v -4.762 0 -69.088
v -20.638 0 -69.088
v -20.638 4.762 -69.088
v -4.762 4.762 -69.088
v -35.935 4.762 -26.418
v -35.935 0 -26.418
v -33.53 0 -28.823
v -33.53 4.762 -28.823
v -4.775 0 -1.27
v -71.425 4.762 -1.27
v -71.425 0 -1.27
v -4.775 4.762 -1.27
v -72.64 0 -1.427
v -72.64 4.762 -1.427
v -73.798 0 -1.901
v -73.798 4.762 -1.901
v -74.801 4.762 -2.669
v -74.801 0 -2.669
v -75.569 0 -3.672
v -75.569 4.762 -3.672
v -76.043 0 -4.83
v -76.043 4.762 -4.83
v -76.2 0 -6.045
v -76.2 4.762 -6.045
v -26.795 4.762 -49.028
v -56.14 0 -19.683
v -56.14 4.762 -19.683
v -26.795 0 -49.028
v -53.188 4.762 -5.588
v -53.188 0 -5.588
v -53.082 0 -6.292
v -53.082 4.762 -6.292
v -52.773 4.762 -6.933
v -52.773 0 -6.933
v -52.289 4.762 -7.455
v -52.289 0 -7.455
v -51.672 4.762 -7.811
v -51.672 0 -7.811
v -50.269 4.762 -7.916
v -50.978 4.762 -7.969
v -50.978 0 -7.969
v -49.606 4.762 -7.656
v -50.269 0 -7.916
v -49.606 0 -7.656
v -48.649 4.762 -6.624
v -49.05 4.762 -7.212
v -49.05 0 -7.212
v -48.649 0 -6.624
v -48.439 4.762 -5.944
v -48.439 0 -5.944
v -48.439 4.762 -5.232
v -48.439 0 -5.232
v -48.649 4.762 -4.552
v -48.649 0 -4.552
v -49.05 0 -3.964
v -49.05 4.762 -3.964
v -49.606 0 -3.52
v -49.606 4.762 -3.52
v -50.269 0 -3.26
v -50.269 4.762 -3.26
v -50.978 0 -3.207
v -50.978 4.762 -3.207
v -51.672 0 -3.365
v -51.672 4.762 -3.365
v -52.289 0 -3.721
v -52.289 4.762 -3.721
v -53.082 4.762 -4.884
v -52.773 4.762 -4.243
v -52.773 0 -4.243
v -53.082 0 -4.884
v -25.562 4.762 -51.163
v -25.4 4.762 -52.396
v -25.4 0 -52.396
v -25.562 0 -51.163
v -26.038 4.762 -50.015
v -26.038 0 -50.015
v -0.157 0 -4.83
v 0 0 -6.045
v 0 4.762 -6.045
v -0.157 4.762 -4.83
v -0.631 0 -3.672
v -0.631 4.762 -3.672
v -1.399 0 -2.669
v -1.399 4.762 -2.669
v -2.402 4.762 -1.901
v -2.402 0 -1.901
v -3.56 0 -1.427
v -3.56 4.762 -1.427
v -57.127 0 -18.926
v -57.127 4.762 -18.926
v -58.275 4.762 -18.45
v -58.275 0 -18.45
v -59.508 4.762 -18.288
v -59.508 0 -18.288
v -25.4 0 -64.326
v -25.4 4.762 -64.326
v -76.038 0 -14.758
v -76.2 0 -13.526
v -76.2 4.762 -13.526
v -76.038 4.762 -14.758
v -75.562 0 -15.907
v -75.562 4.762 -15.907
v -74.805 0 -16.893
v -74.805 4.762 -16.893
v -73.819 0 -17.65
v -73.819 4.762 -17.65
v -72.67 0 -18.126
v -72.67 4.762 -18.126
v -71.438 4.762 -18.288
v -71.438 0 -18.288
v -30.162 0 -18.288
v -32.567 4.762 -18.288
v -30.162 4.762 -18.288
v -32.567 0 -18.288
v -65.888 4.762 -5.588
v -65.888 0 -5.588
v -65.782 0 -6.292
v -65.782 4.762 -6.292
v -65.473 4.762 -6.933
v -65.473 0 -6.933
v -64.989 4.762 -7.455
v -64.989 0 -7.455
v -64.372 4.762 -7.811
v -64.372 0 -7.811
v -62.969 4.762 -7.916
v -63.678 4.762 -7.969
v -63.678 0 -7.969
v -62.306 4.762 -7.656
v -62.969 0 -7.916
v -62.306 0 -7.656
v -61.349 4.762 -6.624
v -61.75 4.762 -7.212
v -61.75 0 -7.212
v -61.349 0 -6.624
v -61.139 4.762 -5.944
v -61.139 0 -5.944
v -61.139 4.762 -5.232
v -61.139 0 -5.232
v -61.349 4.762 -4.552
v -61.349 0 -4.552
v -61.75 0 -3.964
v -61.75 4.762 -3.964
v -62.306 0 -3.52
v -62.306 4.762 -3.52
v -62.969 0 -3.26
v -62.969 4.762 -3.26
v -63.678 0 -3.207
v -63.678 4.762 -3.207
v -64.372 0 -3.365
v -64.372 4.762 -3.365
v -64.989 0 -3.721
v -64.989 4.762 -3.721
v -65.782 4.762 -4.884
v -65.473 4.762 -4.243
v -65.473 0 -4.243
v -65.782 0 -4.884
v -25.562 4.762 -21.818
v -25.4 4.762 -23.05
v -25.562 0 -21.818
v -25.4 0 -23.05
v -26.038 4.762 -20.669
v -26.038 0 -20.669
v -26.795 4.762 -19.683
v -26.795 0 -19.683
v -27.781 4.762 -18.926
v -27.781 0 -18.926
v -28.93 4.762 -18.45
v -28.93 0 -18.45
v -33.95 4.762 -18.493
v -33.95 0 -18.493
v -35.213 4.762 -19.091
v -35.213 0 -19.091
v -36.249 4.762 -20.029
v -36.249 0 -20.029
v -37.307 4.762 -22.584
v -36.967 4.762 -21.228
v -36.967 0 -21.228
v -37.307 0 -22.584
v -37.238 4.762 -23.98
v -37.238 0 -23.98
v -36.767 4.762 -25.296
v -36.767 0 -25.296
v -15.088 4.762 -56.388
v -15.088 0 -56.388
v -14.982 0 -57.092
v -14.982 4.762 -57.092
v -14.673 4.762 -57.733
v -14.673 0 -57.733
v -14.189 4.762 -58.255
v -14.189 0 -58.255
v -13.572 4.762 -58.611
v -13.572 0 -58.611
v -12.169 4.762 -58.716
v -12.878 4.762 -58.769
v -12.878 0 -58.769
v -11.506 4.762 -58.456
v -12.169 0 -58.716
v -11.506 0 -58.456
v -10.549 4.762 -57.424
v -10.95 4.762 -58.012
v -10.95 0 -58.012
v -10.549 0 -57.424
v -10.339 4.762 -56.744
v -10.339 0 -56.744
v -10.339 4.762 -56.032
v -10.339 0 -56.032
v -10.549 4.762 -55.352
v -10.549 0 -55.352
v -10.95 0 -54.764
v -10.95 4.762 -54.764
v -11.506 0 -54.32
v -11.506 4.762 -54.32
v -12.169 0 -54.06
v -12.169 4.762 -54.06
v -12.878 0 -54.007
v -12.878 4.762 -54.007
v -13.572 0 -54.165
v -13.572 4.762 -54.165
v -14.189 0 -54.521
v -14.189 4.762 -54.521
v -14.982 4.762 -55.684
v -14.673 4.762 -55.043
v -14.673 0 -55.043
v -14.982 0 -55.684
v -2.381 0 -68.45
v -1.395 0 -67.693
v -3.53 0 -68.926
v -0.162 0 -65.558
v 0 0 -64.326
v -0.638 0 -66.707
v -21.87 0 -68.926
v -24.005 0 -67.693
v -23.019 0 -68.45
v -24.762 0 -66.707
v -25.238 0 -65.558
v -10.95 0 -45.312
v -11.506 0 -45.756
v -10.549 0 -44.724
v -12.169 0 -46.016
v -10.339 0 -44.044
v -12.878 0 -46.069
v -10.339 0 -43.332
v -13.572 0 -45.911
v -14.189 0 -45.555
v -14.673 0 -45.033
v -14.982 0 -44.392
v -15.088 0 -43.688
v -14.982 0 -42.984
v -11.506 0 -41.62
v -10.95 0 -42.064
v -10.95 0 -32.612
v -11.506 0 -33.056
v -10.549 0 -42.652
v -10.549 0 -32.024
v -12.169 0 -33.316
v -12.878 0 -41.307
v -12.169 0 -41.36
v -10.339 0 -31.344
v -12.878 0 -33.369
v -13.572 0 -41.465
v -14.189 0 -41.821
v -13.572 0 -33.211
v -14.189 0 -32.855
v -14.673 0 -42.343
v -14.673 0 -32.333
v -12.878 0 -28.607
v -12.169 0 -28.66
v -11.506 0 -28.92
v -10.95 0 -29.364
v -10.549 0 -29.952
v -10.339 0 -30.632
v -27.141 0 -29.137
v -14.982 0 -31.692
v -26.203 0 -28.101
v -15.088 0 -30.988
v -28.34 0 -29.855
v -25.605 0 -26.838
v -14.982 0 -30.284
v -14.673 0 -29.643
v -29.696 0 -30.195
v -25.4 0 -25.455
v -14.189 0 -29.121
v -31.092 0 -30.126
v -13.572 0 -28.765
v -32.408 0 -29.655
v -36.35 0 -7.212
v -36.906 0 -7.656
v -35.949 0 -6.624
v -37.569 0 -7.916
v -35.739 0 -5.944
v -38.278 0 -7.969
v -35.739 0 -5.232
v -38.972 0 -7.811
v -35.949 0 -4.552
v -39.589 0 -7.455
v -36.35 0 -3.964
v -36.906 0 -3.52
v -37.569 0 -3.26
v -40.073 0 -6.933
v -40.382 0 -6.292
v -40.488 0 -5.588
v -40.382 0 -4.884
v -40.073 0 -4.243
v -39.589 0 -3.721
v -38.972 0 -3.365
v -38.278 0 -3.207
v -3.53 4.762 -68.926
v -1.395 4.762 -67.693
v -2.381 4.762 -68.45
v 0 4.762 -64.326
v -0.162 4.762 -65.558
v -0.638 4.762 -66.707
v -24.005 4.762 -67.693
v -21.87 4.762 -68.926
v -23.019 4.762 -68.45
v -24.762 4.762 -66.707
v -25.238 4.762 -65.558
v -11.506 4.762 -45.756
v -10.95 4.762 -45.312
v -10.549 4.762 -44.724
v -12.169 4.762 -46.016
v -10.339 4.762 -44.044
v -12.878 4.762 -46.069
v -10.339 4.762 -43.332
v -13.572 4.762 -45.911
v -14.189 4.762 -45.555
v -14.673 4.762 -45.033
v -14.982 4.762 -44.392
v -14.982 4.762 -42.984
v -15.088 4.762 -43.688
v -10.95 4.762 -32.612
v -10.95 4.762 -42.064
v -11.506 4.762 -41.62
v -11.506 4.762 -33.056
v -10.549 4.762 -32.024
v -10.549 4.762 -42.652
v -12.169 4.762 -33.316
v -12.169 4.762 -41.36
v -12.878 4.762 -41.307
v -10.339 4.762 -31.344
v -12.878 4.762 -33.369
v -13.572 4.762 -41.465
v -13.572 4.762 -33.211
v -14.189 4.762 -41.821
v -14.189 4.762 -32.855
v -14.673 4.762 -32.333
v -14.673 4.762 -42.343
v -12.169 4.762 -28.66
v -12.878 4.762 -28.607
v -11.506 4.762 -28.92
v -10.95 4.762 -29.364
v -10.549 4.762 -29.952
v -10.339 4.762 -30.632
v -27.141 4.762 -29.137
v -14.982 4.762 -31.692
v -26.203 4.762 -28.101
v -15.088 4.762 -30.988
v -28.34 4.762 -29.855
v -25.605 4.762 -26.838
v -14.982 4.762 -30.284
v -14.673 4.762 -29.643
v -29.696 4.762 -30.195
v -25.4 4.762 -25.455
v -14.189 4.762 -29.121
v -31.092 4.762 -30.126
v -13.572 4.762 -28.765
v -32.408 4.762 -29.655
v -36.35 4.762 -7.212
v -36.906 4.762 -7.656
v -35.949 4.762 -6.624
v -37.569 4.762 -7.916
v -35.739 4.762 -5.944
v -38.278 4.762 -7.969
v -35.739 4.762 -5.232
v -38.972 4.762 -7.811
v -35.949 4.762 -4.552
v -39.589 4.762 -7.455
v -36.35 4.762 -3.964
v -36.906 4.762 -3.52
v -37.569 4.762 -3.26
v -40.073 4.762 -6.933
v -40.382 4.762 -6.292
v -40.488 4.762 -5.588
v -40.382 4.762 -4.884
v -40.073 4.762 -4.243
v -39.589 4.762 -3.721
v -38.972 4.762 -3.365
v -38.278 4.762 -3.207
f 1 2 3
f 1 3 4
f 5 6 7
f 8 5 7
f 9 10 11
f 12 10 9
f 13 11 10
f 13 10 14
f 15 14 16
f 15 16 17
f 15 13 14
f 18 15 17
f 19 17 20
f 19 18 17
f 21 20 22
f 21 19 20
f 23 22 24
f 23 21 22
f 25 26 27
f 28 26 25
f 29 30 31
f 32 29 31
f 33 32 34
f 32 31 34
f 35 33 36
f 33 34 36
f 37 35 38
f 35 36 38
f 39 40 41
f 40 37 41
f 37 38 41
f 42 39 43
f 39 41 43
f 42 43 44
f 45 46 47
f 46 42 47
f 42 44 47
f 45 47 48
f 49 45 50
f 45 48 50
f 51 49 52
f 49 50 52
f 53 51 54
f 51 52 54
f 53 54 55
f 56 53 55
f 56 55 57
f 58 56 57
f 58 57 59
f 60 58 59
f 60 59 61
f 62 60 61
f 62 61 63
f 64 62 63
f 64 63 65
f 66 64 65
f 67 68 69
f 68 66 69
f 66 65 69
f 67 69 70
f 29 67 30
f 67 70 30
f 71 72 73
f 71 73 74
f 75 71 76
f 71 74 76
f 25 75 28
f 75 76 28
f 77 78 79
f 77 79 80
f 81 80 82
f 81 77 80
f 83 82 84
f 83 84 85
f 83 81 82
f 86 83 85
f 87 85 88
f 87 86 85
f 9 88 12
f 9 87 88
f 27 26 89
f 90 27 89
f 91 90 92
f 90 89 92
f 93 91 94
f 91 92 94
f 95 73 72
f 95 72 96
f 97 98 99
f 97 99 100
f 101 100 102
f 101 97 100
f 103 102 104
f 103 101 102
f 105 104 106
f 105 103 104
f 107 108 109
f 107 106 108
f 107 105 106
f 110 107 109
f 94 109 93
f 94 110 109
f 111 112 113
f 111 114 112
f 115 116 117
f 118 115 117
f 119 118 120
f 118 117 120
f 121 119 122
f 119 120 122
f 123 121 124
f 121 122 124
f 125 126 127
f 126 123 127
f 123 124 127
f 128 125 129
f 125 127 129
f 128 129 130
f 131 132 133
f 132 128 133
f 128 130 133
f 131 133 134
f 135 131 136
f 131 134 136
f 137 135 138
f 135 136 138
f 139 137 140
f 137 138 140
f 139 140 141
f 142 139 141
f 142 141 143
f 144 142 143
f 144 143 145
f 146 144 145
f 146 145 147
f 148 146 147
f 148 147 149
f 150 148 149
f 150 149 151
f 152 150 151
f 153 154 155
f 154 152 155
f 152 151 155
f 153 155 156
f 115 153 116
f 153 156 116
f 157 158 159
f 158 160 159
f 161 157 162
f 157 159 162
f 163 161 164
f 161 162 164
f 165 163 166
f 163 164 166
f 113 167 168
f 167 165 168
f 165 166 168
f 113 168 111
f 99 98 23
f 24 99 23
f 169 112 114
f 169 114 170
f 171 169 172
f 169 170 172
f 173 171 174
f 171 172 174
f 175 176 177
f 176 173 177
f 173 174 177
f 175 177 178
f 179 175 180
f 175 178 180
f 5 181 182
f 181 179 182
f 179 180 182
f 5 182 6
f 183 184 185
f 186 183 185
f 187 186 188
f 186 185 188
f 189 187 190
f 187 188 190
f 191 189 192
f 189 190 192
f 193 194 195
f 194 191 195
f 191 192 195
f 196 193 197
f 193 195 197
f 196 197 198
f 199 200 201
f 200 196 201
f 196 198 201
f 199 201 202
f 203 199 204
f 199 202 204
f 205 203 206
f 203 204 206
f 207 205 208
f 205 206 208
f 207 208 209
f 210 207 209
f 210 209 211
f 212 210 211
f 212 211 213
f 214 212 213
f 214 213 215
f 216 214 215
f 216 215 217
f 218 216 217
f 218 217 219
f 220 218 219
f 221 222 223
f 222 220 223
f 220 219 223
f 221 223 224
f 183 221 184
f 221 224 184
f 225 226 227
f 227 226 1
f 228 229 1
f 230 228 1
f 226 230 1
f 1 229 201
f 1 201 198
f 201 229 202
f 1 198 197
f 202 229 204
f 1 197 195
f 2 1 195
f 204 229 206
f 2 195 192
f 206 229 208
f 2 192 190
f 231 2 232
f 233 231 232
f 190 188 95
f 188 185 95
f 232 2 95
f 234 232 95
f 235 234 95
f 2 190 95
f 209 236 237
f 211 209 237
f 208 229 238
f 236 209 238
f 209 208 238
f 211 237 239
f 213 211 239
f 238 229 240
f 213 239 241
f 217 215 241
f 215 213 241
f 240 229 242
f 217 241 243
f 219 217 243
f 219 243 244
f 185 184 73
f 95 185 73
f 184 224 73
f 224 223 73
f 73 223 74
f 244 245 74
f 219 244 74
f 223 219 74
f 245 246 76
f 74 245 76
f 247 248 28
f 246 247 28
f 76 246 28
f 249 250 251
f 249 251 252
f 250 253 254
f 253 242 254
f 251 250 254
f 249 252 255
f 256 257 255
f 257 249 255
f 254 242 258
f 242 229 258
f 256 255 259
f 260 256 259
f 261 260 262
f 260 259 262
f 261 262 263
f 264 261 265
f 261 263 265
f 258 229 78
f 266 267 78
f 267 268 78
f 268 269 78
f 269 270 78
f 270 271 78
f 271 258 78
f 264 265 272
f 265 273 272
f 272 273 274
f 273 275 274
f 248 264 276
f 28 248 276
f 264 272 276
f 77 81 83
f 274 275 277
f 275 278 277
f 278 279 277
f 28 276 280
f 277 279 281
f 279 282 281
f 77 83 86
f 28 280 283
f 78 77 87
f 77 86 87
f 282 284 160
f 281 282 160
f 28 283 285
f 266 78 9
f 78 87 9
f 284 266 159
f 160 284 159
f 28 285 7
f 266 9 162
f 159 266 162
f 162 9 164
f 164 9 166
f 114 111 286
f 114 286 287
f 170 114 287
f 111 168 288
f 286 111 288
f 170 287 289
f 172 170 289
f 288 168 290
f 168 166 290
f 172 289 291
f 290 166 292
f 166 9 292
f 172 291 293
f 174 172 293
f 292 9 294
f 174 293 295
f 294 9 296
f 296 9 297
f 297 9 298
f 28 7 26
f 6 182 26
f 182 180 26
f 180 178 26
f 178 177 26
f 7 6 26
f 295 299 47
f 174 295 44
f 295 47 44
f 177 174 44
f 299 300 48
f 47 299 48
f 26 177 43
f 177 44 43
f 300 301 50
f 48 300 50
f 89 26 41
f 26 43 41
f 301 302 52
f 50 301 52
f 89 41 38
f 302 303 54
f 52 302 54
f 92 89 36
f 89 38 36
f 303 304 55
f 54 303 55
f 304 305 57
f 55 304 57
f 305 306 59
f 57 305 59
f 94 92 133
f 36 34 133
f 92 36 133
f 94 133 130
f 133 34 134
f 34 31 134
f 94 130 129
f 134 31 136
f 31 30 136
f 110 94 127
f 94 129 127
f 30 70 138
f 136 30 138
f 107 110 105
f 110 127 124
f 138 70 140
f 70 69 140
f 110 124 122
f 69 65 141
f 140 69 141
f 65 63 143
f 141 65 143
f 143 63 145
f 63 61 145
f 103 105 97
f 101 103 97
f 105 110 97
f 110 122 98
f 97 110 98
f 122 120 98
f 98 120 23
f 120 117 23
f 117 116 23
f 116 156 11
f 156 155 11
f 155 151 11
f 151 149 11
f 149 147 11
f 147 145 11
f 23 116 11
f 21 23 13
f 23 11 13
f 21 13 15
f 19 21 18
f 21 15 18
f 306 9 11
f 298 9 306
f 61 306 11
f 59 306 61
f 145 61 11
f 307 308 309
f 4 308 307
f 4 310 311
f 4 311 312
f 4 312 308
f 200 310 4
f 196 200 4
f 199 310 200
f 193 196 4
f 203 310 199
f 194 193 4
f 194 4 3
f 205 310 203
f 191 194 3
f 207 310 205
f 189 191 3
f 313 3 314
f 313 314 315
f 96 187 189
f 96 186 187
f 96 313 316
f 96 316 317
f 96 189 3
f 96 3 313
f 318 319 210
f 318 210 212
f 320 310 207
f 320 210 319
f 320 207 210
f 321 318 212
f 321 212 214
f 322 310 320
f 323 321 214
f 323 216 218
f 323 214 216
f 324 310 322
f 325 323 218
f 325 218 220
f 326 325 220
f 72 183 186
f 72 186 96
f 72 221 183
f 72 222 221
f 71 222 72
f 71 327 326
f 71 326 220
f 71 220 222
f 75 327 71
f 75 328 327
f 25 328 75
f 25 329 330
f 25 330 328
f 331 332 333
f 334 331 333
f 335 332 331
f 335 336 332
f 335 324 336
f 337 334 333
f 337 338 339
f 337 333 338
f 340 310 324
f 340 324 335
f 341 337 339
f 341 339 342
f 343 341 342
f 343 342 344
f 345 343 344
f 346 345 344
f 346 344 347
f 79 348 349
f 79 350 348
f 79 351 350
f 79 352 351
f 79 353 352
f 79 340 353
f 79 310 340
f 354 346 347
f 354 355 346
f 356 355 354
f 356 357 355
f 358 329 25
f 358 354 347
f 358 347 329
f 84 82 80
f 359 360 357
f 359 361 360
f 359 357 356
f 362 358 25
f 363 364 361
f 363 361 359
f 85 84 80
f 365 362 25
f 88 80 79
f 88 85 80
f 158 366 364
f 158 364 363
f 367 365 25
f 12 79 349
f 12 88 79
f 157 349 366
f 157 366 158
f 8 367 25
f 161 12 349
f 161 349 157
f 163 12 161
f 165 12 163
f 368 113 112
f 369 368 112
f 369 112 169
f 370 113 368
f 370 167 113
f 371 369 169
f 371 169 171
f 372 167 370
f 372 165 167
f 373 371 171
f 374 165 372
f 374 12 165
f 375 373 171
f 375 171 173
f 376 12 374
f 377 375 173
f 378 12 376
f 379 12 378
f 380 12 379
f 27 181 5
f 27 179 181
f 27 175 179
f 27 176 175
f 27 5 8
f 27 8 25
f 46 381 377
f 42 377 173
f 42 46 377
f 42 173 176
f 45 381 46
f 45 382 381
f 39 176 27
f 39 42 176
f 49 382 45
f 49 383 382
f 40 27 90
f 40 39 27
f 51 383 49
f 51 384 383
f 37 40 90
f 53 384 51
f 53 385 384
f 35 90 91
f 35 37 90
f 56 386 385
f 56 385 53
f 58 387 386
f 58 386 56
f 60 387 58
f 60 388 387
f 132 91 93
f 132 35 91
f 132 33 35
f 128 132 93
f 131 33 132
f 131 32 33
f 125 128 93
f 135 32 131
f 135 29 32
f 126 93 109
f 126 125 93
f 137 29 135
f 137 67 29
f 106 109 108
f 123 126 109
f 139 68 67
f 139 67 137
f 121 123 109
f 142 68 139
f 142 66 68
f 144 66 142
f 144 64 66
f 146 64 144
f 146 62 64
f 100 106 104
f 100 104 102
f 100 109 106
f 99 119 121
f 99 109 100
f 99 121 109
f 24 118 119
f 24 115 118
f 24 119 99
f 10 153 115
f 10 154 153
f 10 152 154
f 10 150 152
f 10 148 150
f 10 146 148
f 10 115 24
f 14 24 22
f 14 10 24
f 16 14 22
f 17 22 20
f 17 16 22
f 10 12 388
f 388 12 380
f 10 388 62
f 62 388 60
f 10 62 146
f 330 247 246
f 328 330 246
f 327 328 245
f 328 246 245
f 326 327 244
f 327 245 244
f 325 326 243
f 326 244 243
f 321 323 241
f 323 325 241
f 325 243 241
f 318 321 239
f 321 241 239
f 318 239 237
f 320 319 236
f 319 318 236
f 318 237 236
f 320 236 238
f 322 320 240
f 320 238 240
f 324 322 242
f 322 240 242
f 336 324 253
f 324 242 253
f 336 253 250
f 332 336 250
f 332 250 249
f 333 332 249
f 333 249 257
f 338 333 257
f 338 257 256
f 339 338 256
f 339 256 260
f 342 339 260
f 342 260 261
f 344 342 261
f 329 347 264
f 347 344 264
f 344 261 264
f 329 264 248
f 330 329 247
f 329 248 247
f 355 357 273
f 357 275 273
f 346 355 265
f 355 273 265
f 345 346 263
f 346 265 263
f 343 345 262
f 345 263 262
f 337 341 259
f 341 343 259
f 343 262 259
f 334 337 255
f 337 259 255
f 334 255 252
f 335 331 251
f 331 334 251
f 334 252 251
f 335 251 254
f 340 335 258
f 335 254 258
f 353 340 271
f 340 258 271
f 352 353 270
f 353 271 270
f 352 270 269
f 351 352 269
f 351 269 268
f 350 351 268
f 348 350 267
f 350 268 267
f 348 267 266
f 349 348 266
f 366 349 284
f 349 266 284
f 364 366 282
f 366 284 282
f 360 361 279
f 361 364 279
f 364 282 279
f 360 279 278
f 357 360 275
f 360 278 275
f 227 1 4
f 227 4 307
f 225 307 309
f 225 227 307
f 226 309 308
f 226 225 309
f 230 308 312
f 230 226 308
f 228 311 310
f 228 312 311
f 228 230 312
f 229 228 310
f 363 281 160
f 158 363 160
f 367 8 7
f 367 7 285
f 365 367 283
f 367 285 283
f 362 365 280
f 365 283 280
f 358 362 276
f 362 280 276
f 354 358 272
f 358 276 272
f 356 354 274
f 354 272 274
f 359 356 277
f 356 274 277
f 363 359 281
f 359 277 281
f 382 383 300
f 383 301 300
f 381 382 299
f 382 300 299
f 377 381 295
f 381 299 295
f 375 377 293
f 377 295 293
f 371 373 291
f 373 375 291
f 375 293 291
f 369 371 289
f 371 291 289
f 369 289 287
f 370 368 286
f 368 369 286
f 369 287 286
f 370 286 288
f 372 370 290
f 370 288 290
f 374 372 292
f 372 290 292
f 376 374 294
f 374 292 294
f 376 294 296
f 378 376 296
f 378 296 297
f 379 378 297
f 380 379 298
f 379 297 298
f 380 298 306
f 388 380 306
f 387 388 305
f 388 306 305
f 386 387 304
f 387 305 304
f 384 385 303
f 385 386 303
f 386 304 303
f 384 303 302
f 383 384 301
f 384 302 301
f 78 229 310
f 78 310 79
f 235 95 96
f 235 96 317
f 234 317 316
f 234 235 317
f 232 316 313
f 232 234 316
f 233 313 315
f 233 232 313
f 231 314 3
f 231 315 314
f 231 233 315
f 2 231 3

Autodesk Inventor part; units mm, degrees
ref_plane "YZ Plane" through (0, 0, 0) normal (1, 0, 0) x (0, 1, 0)
ref_plane "XZ Plane" through (0, 0, 0) normal (0, 1, 0) x (-1, 0, 0)
ref_plane "XY Plane" through (0, 0, 0) normal (0, 0, 1) x (1, 0, 0)
sketch "Sketch1" plane through (0, 0, 0) normal (0, 1, 0) x (-1, 0, 0)
  line L0 (0, 7.112) -> (15.875, 7.112) construction
  line L1 (20.6375, -69.088) -> (4.7625, -69.088)
  line L2 (0, -64.3255) -> (0, -4.7625)
  line L3 (30.1625, -18.288) -> (76.2, -18.288) construction
  line L4 (76.2, -13.5255) -> (76.2, -4.7625)
  line L5 (71.4375, 0) -> (4.7625, 0)
  line L6 (25.4, -69.088) -> (25.4, -23.0505) construction
  arc A0 (30.1625, -18.288) -> (25.4, -23.0505) centre (30.1625, -23.0505) ccw construction
  arc A1 (0, -64.3255) -> (4.7625, -69.088) centre (4.7625, -64.3255) ccw
  arc A2 (76.2, -4.7625) -> (71.4375, 0) centre (71.4375, -4.7625) ccw
  arc A3 (4.7625, 0) -> (0, -4.7625) centre (4.7625, -4.7625) ccw
  circle A4 centre (12.7, -30.988) radius 2.3876
  circle A5 centre (12.7, -43.688) radius 2.3876
  circle A6 centre (12.7, -56.388) radius 2.3876
  circle A7 centre (63.5, -5.588) radius 2.3876
  circle A8 centre (50.8, -5.588) radius 2.3876
  circle A9 centre (38.1, -5.588) radius 2.3876
  line L7 (76.2, -5.588) -> (0, -5.588) construction
  line L8 (12.7, 0) -> (12.7, -69.088) construction
  line L9 (61.8117, -7.2763) -> (14.3883, -54.6997) construction
  line L10 (56.1403, -19.6829) -> (26.7949, -49.0283)
  line L11 (71.4375, -18.288) -> (59.5079, -18.288)
  line L12 (25.4, -52.3959) -> (25.4, -64.3255)
  arc A10 (71.4375, -18.288) -> (76.2, -13.5255) centre (71.4375, -13.5255) ccw
  arc A11 (20.6375, -69.088) -> (25.4, -64.3255) centre (20.6375, -64.3255) ccw
  arc A12 (59.5079, -18.288) -> (56.1403, -19.6829) centre (59.5079, -23.0505) ccw
  arc A13 (26.7949, -49.0283) -> (25.4, -52.3959) centre (30.1625, -52.3959) ccw
  line L13 (35.9347, -26.4181) -> (33.5301, -28.8227)
  line L14 (25.4, -25.4551) -> (25.4, -23.0505)
  line L15 (32.5671, -18.288) -> (30.1625, -18.288)
  arc A14 (30.1625, -18.288) -> (25.4, -23.0505) centre (30.1625, -23.0505) ccw
  arc A15 (35.9347, -26.4181) -> (32.5671, -18.288) centre (32.5671, -23.0505) ccw
  arc A16 (25.4, -25.4551) -> (33.5301, -28.8227) centre (30.1625, -25.4551) ccw
  point P0 (0, 0)
  point P1 (0, -69.088)
  point P2 (38.1, -5.588)
  point P3 (57.5352, -18.288)
  point P4 (25.4, -50.4232)
  point P5 (44.0648, -18.288)
  point P6 (25.4, -36.9528)
  dimension "d0" = 76.2
  dimension "d1" = 25.4
  dimension "d2" = 4.7625
  dimension "d3" = 4.7752
  dimension "d4" = 12.7
  dimension "d5" = 12.7
  dimension "d6" = 12.7
  dimension "d7" = 12.7
  dimension "d8" = 66.675
  dimension "d9" = 25.4
  dimension "d10" = 38.1
  dimension "d11" = 18.288
  dimension "d12" = 38.1
  dimension "d13" = 12.7
  dimension "d14" = 12.7
  dimension "d15" = 4.7625
  dimension "d16" = 4.7625
  dimension "d17" = 4.7625
  dimension "d18" = 4.7625
extrude "Extrusion1" add sketch "Sketch1" along normal blind 4.7625
thread "Thread1" size "10-32 UNF" class "2B" standard "ANSI Unified Screw Threads" full length
thread "Thread2" size "10-32 UNF" class "2B" standard "ANSI Unified Screw Threads" full length
thread "Thread3" size "10-32 UNF" class "2B" standard "ANSI Unified Screw Threads" full length
thread "Thread4" size "10-32 UNF" class "2B" standard "ANSI Unified Screw Threads" full length
thread "Thread5" size "10-32 UNF" class "2B" standard "ANSI Unified Screw Threads" full length
thread "Thread6" size "10-32 UNF" class "2B" standard "ANSI Unified Screw Threads" full length
sketch "Sketch2" plane through (0, 4.7625, 0) normal (0, 1, 0) x (1, 0, 0)
  line L0 (-71.4375, 0) -> (-4.7625, 0) projected
  line L1 (-76.2, 1.27) -> (0, 1.27)
  line L2 (-76.2, 13.5255) -> (-76.2, 4.7625) projected
  line L3 (0, 4.7625) -> (0, 64.3255) projected
  arc A0 (-4.7625, 0) -> (0, 4.7625) centre (-4.7625, 4.7625) ccw projected
  line L4 (-4.7625, 0) -> (0, 0)
  line L5 (0, 0) -> (0, 1.27)
  line L6 (-76.2, 1.27) -> (-76.2, 0)
  line L7 (-76.2, 0) -> (-71.4375, 0)
  point P0 (-1.5246, 1.27)
  dimension "d33" = 1.27
extrude "Extrusion2" cut sketch "Sketch2" against normal through all contours L7 L6 L1 A0 L0
fillet "Fillet1" radius 4.7752 2 edges at (-74.6754, 2.3813, -1.27) (-1.5246, 2.3813, -1.27)
properties part number "ELEV_006_SUPBRK1_THRD" material "Aluminum 6061"
